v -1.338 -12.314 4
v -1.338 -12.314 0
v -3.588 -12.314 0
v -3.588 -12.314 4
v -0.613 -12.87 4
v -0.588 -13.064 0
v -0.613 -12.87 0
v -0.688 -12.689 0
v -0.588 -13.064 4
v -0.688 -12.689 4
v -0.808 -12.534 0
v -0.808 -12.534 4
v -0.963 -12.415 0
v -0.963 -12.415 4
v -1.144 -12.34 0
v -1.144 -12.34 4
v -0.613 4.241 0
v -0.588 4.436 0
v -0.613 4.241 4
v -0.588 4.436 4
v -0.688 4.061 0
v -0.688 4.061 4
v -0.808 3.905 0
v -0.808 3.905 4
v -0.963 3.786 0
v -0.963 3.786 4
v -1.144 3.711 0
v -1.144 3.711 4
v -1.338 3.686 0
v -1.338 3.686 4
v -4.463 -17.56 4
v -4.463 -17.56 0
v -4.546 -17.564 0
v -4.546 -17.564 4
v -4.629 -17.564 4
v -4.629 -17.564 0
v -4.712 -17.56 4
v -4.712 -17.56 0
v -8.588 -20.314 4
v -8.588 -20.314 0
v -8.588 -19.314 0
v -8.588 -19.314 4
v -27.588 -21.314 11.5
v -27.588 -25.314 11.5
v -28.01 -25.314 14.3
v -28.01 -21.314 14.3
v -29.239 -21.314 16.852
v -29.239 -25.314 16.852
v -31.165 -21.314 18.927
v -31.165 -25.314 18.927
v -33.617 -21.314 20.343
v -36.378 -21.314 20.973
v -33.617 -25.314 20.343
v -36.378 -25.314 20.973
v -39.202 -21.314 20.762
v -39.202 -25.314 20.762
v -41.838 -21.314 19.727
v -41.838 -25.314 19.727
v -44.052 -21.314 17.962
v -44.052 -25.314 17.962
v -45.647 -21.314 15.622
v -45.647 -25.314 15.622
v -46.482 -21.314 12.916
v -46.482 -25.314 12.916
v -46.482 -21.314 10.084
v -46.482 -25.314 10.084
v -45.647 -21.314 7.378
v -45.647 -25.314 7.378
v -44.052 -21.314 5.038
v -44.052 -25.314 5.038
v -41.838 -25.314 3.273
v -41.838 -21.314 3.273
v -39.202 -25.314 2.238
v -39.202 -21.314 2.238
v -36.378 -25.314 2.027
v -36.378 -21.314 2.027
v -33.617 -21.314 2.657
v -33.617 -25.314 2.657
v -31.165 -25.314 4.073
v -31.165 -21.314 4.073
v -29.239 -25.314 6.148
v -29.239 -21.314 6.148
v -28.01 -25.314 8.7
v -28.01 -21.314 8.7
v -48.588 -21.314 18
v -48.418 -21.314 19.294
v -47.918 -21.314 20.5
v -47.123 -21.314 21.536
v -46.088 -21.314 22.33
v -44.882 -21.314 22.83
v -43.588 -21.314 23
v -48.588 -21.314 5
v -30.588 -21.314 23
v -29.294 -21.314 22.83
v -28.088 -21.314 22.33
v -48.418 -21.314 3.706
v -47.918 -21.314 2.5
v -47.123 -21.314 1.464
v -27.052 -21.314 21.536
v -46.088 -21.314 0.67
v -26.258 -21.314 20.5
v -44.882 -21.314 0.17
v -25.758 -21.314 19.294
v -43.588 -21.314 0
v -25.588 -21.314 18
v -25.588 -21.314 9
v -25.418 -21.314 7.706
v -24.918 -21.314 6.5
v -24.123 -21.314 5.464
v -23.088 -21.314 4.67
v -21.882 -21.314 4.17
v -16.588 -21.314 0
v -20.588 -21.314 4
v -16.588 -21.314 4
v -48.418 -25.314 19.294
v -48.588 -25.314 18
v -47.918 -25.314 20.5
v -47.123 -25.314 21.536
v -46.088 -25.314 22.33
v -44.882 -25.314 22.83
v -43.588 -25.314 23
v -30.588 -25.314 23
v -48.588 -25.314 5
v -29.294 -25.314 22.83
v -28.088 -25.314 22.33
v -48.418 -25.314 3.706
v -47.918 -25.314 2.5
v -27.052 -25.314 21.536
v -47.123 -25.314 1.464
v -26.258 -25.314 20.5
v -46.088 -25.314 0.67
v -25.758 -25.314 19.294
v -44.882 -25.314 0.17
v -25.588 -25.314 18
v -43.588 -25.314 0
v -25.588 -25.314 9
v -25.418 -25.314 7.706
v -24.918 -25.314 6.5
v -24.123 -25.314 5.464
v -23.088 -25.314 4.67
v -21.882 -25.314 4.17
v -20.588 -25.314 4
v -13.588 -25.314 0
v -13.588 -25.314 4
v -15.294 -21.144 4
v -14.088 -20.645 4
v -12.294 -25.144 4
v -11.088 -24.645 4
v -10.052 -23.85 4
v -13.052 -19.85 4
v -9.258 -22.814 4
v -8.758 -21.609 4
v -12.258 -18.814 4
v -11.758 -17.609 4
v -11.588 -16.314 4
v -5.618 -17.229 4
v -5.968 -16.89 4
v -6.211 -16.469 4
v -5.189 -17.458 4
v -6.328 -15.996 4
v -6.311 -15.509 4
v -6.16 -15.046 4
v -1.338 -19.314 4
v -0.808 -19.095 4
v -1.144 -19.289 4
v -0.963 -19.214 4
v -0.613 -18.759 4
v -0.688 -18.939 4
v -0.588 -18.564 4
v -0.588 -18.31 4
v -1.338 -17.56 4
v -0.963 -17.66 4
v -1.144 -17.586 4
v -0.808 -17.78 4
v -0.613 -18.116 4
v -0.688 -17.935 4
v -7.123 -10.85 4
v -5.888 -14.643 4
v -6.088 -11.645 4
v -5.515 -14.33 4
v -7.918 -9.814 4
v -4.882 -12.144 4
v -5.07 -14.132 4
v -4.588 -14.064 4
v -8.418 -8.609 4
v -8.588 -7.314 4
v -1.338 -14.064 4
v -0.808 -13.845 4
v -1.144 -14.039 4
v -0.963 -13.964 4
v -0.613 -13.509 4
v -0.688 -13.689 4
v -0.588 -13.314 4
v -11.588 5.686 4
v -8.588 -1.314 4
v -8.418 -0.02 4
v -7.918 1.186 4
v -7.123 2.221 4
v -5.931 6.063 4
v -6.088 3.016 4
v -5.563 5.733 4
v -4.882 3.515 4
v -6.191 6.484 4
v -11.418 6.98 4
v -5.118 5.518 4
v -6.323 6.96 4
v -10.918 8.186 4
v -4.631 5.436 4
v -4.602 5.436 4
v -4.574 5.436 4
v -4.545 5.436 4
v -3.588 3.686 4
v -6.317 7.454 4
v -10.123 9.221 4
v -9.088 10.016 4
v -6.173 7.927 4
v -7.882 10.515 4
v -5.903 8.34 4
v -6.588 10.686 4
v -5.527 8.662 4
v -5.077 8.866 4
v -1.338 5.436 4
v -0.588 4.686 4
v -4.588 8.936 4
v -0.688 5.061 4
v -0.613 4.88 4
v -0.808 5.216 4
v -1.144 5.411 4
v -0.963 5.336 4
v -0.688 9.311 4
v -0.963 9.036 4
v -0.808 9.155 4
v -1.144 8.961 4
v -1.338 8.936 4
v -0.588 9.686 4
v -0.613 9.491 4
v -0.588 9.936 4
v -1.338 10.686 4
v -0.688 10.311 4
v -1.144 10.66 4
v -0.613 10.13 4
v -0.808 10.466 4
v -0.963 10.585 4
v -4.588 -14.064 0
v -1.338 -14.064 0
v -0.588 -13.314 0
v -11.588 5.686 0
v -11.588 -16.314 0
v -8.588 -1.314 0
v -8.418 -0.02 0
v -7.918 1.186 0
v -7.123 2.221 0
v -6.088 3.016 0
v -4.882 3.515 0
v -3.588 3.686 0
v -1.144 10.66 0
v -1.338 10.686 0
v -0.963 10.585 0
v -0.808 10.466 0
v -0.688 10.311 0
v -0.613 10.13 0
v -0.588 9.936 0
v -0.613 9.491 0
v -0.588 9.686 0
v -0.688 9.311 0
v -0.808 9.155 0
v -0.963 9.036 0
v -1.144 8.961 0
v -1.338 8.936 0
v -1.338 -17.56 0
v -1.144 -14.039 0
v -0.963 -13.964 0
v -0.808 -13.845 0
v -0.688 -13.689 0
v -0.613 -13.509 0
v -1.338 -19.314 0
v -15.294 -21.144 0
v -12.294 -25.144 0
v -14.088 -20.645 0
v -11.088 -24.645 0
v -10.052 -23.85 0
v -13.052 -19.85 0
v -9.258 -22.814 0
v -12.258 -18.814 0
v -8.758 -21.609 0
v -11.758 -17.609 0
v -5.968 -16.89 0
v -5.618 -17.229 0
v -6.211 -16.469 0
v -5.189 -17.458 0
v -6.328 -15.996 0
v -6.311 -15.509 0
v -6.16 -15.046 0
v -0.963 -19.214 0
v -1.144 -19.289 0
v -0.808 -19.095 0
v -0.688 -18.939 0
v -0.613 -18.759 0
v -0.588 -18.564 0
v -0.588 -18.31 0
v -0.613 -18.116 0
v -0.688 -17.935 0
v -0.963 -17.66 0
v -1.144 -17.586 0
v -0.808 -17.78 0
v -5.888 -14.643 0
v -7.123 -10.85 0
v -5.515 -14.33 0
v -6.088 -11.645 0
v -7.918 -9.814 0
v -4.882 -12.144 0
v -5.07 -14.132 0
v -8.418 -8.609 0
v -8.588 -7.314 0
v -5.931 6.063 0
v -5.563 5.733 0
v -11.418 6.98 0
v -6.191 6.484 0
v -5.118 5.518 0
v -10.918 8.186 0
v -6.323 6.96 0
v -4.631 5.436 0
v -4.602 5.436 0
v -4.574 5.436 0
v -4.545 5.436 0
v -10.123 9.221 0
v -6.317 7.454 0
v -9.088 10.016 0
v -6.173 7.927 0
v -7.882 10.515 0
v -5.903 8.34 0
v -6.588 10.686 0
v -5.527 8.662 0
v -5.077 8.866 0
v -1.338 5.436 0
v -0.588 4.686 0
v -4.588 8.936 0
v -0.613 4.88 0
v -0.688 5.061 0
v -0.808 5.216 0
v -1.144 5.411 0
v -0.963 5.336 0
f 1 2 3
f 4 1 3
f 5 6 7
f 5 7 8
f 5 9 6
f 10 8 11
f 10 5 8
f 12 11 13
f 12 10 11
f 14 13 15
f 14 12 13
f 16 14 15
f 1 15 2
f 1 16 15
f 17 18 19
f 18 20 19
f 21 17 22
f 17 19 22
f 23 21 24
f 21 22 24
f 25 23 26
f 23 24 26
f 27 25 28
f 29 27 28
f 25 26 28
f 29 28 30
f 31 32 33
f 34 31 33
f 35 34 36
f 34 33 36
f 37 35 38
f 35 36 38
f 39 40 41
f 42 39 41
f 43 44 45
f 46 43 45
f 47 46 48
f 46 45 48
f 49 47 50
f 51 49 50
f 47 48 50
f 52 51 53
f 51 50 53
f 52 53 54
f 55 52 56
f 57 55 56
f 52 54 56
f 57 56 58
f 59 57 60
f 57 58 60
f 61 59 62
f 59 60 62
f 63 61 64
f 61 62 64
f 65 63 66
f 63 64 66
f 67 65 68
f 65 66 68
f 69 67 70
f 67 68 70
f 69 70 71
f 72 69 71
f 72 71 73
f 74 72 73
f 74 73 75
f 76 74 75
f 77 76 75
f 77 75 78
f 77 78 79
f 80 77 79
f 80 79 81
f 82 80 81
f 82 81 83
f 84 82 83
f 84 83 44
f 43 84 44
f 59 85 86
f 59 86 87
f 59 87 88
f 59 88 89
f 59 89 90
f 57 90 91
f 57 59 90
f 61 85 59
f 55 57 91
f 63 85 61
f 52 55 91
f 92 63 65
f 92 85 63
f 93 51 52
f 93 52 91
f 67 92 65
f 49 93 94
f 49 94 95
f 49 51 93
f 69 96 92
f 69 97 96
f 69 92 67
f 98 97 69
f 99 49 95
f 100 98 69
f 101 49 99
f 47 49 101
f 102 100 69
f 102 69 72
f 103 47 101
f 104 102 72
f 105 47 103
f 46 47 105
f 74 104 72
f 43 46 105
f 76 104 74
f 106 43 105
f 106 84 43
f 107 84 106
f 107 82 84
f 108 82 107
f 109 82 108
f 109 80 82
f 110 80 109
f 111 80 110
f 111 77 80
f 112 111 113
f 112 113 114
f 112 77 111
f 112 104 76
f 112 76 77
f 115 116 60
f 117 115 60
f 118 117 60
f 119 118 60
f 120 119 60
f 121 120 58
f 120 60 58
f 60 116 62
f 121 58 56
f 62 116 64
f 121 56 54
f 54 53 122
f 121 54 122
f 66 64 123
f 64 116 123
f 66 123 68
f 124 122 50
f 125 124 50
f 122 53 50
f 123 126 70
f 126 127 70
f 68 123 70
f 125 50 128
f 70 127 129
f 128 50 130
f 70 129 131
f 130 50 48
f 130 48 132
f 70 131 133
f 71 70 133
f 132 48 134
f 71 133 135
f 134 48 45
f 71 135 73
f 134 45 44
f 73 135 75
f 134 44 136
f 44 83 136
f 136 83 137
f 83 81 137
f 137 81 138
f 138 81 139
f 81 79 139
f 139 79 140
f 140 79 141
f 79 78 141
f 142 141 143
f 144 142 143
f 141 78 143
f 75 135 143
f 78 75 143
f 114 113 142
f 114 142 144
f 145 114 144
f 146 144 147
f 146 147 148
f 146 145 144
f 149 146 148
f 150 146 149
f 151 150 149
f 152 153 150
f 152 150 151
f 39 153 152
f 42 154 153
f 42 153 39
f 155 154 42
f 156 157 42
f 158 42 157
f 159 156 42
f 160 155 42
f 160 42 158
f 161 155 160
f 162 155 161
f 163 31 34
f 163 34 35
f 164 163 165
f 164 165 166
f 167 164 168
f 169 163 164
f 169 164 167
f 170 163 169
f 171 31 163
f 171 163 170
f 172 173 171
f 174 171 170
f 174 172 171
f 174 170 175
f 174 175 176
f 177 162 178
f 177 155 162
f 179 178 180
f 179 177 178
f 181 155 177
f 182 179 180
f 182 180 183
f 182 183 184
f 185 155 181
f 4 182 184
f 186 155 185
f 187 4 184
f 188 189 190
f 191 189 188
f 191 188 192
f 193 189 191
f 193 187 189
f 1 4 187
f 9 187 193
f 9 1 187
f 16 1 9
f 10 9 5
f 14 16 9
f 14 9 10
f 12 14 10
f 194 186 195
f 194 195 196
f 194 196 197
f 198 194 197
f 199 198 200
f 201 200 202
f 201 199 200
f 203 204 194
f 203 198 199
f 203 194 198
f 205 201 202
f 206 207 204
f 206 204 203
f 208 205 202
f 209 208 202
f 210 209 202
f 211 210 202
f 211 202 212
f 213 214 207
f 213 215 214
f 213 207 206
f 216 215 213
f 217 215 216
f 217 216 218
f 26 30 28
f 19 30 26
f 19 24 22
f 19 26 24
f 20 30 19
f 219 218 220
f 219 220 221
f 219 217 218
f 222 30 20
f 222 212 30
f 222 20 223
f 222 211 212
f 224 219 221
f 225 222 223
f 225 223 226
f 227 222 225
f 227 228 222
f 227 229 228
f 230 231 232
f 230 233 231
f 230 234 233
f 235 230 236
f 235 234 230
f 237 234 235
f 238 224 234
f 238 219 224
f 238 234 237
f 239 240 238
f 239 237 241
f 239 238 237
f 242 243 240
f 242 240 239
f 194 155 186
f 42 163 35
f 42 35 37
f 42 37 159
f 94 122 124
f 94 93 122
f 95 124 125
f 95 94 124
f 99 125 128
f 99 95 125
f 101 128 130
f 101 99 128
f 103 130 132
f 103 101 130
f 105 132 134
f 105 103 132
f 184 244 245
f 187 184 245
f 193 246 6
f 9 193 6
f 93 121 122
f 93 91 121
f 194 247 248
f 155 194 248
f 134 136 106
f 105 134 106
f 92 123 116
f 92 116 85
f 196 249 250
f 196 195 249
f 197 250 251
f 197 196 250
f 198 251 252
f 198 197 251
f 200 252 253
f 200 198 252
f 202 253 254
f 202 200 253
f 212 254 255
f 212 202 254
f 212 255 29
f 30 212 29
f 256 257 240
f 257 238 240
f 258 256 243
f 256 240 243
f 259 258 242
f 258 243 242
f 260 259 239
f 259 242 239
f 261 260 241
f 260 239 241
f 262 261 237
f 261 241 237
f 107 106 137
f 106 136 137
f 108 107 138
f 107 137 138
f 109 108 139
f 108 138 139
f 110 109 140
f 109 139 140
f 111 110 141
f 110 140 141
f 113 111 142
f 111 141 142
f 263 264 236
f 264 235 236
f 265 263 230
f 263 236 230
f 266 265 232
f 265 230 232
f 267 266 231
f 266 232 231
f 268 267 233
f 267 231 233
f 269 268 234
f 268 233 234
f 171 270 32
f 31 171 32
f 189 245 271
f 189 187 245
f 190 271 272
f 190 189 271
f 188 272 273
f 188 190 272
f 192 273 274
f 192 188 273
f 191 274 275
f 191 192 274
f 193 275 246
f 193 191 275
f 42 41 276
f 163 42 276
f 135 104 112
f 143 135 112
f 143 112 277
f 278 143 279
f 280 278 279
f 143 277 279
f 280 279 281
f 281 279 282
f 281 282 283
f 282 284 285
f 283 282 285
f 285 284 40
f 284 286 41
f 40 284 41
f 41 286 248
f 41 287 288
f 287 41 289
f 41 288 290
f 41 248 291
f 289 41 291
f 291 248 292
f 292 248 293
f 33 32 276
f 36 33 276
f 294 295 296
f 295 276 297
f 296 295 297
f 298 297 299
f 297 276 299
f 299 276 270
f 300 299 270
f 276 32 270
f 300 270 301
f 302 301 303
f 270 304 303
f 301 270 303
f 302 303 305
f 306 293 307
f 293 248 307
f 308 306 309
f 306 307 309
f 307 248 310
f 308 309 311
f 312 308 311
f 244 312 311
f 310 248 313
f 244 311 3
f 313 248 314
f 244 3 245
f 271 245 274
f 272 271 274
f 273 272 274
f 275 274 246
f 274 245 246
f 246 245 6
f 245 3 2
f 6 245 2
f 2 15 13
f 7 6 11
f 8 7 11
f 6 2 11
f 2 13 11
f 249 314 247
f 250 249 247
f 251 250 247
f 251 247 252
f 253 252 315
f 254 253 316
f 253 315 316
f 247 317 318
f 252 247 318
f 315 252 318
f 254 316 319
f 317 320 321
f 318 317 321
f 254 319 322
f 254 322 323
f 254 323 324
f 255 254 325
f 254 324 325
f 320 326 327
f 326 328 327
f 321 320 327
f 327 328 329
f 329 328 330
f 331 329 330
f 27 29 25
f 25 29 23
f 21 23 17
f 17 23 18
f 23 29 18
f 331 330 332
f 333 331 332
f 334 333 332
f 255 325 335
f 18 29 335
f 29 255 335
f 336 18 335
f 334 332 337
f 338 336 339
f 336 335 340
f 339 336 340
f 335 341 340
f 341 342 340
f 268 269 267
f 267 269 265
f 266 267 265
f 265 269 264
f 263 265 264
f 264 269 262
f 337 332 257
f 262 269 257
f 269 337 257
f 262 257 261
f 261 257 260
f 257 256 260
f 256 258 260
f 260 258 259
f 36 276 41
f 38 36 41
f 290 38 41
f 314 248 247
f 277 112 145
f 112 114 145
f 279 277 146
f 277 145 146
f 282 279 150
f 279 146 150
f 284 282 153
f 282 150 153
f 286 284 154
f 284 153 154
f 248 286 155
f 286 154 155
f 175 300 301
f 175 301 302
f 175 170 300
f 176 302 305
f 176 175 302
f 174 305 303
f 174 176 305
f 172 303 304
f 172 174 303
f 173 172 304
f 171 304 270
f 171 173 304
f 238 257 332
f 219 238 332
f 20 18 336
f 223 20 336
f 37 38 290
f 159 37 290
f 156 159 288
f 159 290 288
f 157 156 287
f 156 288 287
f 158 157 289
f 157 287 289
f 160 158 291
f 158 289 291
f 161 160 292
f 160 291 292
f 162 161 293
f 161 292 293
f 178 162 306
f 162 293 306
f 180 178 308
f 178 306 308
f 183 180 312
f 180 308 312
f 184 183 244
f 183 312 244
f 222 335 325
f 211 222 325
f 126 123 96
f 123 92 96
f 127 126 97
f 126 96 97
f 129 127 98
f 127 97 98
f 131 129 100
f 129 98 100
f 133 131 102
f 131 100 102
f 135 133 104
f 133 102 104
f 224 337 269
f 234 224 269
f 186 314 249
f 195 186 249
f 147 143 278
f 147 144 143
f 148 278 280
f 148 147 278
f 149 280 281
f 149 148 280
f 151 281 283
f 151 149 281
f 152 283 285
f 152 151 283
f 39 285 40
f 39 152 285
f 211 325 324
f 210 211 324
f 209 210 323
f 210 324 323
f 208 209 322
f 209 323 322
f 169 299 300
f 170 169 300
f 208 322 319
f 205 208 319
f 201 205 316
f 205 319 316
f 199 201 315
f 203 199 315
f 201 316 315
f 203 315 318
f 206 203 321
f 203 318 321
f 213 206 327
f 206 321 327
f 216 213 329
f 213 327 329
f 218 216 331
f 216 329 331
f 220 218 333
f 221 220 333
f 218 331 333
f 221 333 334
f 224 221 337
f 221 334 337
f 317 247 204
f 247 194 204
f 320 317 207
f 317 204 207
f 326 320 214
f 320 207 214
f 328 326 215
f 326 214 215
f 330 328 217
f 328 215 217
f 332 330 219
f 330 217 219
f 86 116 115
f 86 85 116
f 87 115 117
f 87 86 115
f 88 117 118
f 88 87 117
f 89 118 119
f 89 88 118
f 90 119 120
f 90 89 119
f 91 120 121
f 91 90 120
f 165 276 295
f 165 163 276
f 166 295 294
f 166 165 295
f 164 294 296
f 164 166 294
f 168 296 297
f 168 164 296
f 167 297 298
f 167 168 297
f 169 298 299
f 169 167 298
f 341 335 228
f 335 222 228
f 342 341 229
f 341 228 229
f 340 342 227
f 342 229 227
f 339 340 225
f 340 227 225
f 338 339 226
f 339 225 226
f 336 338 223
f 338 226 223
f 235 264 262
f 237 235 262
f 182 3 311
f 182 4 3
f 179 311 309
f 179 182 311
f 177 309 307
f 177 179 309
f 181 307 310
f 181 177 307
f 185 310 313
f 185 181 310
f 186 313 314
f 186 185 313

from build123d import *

# Parameters (mm, degrees)
F1_DEPTH = 4
F0_W     = 23
F0_H     = 4
F0_W_2   = 15
F0_H_2   = 1
F2_DEPTH = 23
F3_R     = 9.5
F4_DEPTH = 25
F5_R     = 5
F6_R     = 5
F7_R     = 0.75


with BuildPart() as f1:
    # F0 (on Top) → F1 (new body)
    with BuildSketch(Plane.XY):
        Polygon((-8.587917, 10.685558), (-11.587917, 10.685558), (-11.587917, -21.314442), (-8.587917, -21.314442), (-8.587917, -19.314442), (-8.587917, -12.314442), (-8.587917, 3.685558), align=None)
        with BuildLine():
            Line((-0.587917, -12.314442), (-8.587917, -12.314442))
            Line((-8.587917, -12.314442), (-8.587917, -19.314442))
            Line((-8.587917, -19.314442), (-0.587917, -19.314442))
            Line((-0.587917, -19.314442), (-0.587917, -17.560003))
            Line((-0.587917, -17.560003), (-4.463338, -17.560003))
            ThreePointArc((-4.463338, -17.560003), (-4.587917, -17.564442), (-4.712495, -17.560003))
            ThreePointArc((-4.712495, -17.560003), (-6.336806, -15.752114), (-4.587917, -14.064442))
            Line((-4.587917, -14.064442), (-0.587917, -14.064442))
            Line((-0.587917, -14.064442), (-0.587917, -12.314442))
        make_face()
        with BuildLine():
            Line((-0.587917, 10.685558), (-8.587917, 10.685558))
            Line((-8.587917, 10.685558), (-8.587917, 3.685558))
            Line((-8.587917, 3.685558), (-0.587917, 3.685558))
            Line((-0.587917, 3.685558), (-0.587917, 5.436083))
            Line((-0.587917, 5.436083), (-4.545018, 5.436083))
            ThreePointArc((-4.545018, 5.436083), (-4.587917, 5.435558), (-4.630815, 5.436083))
            ThreePointArc((-4.630815, 5.436083), (-6.337785, 7.207009), (-4.587917, 8.935558))
            Line((-4.587917, 8.935558), (-0.587917, 8.935558))
            Line((-0.587917, 8.935558), (-0.587917, 10.685558))
        make_face()
        Polygon((-8.587917, -21.314442), (-11.587917, -21.314442), (-25.587917, -21.314442), (-25.587917, -25.314442), (-8.587917, -25.314442), align=None)
    extrude(amount=F1_DEPTH)

    # F0 (on Top) → F2 (join)
    with BuildSketch(Plane.XY):
        with Locations((-37.087917, -23.314442)):
            Rectangle(F0_W, F0_H)
        with Locations((-37.087917, -23.314442)):
            Rectangle(F0_W_2, F0_H_2, mode=Mode.SUBTRACT)
        with Locations((-37.087917, -23.314442)):
            Rectangle(F0_W_2, F0_H_2)
    extrude(amount=F2_DEPTH)

    # F3 (on face) → F4 (cut)
    with BuildSketch(Plane.XZ.offset(25.314442)):
        with Locations((-37.087917, 11.5)):
            Circle(F3_R)
    extrude(amount=-F4_DEPTH, mode=Mode.SUBTRACT)

    # F5
    f5_edges = [f1.edges().sort_by_distance(p)[0] for p in [
        (-48.587917, -23.314442, 23),
        (-25.587917, -23.314442, 23),
        (-48.587917, -23.314442, 0),
        (-25.587917, -23.314442, 4),
    ]]
    fillet(f5_edges, radius=F5_R)

    # F6
    f6_edges = [f1.edges().sort_by_distance(p)[0] for p in [
        (-8.587917, -25.314442, 2),
        (-11.587917, -21.314442, 2),
        (-8.587917, -12.314442, 2),
        (-8.587917, 3.685558, 2),
        (-11.587917, 10.685558, 2),
    ]]
    fillet(f6_edges, radius=F6_R)

    # F7
    f7_edges = [f1.edges().sort_by_distance(p)[0] for p in [
        (-0.587917, 10.685558, 2),
        (-0.587917, 8.935558, 2),
        (-0.587917, 5.436083, 2),
        (-0.587917, 3.685558, 2),
        (-0.587917, -12.314442, 2),
        (-0.587917, -14.064442, 2),
        (-0.587917, -17.560003, 2),
        (-0.587917, -19.314442, 2),
    ]]
    fillet(f7_edges, radius=F7_R)


solid = f1.part
